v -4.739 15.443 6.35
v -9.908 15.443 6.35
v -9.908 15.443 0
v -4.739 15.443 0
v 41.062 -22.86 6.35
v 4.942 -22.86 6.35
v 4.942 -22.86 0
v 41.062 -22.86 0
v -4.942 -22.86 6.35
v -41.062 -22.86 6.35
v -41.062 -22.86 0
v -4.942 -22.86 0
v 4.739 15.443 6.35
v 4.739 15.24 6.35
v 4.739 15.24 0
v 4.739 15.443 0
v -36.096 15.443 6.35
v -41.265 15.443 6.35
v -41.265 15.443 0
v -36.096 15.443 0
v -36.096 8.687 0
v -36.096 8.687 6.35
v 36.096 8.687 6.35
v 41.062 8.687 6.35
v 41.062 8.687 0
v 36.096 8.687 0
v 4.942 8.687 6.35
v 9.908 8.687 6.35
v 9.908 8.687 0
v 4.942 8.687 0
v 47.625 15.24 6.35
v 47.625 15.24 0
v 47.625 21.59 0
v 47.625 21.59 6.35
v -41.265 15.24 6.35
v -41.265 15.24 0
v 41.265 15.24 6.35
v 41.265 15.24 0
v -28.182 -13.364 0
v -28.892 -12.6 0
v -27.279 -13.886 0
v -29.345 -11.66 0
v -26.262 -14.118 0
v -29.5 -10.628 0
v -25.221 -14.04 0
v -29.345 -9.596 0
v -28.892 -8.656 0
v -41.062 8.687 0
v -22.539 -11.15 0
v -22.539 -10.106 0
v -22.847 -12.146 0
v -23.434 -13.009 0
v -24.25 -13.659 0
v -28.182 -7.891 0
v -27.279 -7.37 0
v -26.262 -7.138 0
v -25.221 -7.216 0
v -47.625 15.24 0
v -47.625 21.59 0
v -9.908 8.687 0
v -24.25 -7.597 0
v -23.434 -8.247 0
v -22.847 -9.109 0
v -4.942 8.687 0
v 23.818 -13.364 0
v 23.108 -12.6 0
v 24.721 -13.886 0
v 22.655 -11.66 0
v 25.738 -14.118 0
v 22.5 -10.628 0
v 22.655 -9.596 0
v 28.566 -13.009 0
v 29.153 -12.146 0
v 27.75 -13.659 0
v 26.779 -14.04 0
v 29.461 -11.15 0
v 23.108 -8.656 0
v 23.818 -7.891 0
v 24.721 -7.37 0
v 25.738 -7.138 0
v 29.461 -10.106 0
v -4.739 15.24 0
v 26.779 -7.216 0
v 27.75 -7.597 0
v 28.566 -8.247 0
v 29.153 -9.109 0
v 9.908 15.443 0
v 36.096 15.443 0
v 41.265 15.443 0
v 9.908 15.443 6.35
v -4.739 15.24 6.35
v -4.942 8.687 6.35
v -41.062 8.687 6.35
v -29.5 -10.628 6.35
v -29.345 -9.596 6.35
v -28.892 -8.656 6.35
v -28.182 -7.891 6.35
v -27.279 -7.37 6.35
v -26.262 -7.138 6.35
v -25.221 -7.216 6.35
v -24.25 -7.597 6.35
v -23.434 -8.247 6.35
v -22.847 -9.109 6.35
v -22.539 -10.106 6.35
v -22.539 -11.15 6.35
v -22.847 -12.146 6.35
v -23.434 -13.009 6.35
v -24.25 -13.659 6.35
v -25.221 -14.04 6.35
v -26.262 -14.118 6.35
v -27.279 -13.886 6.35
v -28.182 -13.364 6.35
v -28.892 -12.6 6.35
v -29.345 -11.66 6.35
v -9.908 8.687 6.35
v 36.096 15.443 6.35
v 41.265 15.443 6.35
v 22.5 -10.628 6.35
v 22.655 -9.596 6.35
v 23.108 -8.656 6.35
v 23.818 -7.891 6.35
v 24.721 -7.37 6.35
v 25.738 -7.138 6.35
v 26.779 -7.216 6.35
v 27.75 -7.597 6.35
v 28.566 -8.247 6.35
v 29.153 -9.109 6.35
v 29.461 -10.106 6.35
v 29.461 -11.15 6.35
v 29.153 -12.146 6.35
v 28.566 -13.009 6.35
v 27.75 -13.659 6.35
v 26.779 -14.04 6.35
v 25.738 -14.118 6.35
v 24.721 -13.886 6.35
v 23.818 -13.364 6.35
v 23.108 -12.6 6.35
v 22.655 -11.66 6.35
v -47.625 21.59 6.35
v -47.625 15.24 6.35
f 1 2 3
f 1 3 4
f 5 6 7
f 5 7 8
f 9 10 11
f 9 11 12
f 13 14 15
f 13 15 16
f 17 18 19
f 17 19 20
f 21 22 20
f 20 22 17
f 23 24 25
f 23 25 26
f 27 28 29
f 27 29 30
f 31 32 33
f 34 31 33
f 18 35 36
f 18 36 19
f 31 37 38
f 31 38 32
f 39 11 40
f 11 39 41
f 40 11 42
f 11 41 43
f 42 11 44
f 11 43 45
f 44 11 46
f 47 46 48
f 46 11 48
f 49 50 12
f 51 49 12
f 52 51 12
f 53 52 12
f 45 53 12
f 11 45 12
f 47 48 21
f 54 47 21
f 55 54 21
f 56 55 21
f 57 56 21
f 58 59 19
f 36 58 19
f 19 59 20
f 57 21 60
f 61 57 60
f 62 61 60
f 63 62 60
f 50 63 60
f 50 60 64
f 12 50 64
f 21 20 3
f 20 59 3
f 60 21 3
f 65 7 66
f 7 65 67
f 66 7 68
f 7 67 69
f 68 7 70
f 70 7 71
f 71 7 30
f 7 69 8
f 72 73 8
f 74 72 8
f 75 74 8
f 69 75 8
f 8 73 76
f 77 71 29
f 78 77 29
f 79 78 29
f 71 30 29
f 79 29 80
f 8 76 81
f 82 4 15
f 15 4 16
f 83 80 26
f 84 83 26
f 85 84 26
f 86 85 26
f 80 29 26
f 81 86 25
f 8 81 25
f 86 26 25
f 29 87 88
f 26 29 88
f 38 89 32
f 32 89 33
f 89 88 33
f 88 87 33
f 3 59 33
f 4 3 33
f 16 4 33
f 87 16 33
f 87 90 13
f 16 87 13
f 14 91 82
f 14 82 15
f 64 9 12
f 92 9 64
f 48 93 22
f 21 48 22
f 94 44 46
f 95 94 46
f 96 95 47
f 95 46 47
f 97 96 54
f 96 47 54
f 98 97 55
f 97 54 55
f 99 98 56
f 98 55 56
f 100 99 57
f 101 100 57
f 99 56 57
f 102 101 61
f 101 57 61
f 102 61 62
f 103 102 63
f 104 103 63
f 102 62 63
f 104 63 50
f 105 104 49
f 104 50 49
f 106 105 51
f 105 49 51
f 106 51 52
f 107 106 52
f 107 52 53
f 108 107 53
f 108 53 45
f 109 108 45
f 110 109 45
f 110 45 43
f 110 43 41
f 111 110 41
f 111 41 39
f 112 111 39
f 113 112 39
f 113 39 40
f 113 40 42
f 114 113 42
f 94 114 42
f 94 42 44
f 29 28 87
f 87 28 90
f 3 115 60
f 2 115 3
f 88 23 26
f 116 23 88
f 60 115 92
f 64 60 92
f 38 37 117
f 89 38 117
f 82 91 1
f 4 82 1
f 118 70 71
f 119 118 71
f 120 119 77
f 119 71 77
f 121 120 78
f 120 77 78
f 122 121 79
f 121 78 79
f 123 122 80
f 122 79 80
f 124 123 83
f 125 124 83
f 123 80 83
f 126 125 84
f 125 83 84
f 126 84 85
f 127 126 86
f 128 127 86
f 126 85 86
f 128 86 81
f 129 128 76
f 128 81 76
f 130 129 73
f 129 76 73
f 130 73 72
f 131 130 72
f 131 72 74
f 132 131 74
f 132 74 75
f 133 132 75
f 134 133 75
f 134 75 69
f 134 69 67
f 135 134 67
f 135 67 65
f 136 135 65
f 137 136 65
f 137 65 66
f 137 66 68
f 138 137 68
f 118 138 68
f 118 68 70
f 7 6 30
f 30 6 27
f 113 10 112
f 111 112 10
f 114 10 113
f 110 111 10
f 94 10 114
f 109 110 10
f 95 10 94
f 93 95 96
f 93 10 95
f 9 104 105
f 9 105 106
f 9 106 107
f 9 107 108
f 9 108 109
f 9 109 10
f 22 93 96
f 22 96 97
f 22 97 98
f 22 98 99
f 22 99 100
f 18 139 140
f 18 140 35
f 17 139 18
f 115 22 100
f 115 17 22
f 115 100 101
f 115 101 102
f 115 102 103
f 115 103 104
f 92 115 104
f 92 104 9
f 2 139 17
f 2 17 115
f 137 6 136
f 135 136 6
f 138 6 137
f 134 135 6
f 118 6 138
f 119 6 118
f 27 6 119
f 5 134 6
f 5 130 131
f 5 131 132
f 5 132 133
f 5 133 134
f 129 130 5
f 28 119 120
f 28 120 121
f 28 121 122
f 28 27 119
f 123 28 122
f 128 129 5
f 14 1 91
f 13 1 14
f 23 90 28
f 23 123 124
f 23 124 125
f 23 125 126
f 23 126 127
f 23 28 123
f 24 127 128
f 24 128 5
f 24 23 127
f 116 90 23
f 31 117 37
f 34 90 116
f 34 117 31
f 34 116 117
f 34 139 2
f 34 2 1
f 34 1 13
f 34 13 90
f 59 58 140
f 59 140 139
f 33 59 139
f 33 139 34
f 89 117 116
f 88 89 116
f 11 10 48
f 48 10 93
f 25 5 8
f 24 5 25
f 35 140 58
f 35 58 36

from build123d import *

# Parameters (mm, degrees)
SKETCH3_W            = 95.25
SKETCH3_H            = 60.96
BOSS_EXTRUDE1_DEPTH  = 6.35
SKETCH4_W            = 6.56336
SKETCH4_H            = 45.72
SKETCH4_W_2          = 9.8836988
CUT_EXTRUDE1_DEPTH   = 6.35
SKETCH5_W            = 5.1689
SKETCH5_H            = 6.7564
CUT_EXTRUDE2_DEPTH   = 57.898976485
SKETCH9_W            = 95.25
SKETCH9_H            = 6.35
CUT_EXTRUDE6_DEPTH   = 8.89
SKETCH11_W           = 82.12328
SKETCH11_H           = 6.35
CUT_EXTRUDE9_DEPTH   = 7.62
M6_CLEARANCE_HOLE2_D = 7


with BuildPart() as part:
    # Sketch3 → Boss-Extrude1 (new body)
    with BuildSketch(Plane.XY):
        Rectangle(SKETCH3_W, SKETCH3_H)
    extrude(amount=BOSS_EXTRUDE1_DEPTH)

    # Sketch4 → Cut-Extrude1 (cut)
    with BuildSketch(Plane.XY.offset(6.35)):
        with Locations((-44.34332, -7.62)):
            Rectangle(SKETCH4_W, SKETCH4_H)
        with Locations((0, -7.62)):
            Rectangle(SKETCH4_W_2, SKETCH4_H)
        with Locations((44.34332, -7.62)):
            Rectangle(SKETCH4_W, SKETCH4_H)
    extrude(amount=-CUT_EXTRUDE1_DEPTH, mode=Mode.SUBTRACT)

    # Sketch5 → Cut-Extrude2 (cut, through all)
    with BuildSketch(Plane.XY.offset(6.35)):
        with Locations((-38.68039, 12.065)):
            Rectangle(SKETCH5_W, SKETCH5_H)
        with Locations((-7.3230994, 12.065)):
            Rectangle(SKETCH5_W, SKETCH5_H)
    cut_extrude2 = extrude(amount=-CUT_EXTRUDE2_DEPTH, mode=Mode.SUBTRACT)

    # Mirror1: Cut-Extrude2 across plane
    add(cut_extrude2.mirror(Plane(origin=(0, 0, 0), x_dir=(0, 0, 1), z_dir=(1, 0, 0))), mode=Mode.SUBTRACT)

    # Sketch9 → Cut-Extrude6 (cut)
    with BuildSketch(Plane(origin=(0, 30.48, 0), x_dir=(1, 0, 0), z_dir=(0, 1, 0))):
        with Locations((0, -3.175)):
            Rectangle(SKETCH9_W, SKETCH9_H)
    extrude(amount=-CUT_EXTRUDE6_DEPTH, mode=Mode.SUBTRACT)

    # Sketch11 → Cut-Extrude9 (cut)
    with BuildSketch(Plane.XZ.offset(30.48)):
        with Locations((0, 3.175)):
            Rectangle(SKETCH11_W, SKETCH11_H)
    extrude(amount=-CUT_EXTRUDE9_DEPTH, mode=Mode.SUBTRACT)

    # M6 Clearance Hole2 (through all)
    with Locations(Plane.XY.offset(6.35)):
        with Locations((26, -10.6279), (-26, -10.6279)):
            Hole(M6_CLEARANCE_HOLE2_D / 2)


solid = part.part
